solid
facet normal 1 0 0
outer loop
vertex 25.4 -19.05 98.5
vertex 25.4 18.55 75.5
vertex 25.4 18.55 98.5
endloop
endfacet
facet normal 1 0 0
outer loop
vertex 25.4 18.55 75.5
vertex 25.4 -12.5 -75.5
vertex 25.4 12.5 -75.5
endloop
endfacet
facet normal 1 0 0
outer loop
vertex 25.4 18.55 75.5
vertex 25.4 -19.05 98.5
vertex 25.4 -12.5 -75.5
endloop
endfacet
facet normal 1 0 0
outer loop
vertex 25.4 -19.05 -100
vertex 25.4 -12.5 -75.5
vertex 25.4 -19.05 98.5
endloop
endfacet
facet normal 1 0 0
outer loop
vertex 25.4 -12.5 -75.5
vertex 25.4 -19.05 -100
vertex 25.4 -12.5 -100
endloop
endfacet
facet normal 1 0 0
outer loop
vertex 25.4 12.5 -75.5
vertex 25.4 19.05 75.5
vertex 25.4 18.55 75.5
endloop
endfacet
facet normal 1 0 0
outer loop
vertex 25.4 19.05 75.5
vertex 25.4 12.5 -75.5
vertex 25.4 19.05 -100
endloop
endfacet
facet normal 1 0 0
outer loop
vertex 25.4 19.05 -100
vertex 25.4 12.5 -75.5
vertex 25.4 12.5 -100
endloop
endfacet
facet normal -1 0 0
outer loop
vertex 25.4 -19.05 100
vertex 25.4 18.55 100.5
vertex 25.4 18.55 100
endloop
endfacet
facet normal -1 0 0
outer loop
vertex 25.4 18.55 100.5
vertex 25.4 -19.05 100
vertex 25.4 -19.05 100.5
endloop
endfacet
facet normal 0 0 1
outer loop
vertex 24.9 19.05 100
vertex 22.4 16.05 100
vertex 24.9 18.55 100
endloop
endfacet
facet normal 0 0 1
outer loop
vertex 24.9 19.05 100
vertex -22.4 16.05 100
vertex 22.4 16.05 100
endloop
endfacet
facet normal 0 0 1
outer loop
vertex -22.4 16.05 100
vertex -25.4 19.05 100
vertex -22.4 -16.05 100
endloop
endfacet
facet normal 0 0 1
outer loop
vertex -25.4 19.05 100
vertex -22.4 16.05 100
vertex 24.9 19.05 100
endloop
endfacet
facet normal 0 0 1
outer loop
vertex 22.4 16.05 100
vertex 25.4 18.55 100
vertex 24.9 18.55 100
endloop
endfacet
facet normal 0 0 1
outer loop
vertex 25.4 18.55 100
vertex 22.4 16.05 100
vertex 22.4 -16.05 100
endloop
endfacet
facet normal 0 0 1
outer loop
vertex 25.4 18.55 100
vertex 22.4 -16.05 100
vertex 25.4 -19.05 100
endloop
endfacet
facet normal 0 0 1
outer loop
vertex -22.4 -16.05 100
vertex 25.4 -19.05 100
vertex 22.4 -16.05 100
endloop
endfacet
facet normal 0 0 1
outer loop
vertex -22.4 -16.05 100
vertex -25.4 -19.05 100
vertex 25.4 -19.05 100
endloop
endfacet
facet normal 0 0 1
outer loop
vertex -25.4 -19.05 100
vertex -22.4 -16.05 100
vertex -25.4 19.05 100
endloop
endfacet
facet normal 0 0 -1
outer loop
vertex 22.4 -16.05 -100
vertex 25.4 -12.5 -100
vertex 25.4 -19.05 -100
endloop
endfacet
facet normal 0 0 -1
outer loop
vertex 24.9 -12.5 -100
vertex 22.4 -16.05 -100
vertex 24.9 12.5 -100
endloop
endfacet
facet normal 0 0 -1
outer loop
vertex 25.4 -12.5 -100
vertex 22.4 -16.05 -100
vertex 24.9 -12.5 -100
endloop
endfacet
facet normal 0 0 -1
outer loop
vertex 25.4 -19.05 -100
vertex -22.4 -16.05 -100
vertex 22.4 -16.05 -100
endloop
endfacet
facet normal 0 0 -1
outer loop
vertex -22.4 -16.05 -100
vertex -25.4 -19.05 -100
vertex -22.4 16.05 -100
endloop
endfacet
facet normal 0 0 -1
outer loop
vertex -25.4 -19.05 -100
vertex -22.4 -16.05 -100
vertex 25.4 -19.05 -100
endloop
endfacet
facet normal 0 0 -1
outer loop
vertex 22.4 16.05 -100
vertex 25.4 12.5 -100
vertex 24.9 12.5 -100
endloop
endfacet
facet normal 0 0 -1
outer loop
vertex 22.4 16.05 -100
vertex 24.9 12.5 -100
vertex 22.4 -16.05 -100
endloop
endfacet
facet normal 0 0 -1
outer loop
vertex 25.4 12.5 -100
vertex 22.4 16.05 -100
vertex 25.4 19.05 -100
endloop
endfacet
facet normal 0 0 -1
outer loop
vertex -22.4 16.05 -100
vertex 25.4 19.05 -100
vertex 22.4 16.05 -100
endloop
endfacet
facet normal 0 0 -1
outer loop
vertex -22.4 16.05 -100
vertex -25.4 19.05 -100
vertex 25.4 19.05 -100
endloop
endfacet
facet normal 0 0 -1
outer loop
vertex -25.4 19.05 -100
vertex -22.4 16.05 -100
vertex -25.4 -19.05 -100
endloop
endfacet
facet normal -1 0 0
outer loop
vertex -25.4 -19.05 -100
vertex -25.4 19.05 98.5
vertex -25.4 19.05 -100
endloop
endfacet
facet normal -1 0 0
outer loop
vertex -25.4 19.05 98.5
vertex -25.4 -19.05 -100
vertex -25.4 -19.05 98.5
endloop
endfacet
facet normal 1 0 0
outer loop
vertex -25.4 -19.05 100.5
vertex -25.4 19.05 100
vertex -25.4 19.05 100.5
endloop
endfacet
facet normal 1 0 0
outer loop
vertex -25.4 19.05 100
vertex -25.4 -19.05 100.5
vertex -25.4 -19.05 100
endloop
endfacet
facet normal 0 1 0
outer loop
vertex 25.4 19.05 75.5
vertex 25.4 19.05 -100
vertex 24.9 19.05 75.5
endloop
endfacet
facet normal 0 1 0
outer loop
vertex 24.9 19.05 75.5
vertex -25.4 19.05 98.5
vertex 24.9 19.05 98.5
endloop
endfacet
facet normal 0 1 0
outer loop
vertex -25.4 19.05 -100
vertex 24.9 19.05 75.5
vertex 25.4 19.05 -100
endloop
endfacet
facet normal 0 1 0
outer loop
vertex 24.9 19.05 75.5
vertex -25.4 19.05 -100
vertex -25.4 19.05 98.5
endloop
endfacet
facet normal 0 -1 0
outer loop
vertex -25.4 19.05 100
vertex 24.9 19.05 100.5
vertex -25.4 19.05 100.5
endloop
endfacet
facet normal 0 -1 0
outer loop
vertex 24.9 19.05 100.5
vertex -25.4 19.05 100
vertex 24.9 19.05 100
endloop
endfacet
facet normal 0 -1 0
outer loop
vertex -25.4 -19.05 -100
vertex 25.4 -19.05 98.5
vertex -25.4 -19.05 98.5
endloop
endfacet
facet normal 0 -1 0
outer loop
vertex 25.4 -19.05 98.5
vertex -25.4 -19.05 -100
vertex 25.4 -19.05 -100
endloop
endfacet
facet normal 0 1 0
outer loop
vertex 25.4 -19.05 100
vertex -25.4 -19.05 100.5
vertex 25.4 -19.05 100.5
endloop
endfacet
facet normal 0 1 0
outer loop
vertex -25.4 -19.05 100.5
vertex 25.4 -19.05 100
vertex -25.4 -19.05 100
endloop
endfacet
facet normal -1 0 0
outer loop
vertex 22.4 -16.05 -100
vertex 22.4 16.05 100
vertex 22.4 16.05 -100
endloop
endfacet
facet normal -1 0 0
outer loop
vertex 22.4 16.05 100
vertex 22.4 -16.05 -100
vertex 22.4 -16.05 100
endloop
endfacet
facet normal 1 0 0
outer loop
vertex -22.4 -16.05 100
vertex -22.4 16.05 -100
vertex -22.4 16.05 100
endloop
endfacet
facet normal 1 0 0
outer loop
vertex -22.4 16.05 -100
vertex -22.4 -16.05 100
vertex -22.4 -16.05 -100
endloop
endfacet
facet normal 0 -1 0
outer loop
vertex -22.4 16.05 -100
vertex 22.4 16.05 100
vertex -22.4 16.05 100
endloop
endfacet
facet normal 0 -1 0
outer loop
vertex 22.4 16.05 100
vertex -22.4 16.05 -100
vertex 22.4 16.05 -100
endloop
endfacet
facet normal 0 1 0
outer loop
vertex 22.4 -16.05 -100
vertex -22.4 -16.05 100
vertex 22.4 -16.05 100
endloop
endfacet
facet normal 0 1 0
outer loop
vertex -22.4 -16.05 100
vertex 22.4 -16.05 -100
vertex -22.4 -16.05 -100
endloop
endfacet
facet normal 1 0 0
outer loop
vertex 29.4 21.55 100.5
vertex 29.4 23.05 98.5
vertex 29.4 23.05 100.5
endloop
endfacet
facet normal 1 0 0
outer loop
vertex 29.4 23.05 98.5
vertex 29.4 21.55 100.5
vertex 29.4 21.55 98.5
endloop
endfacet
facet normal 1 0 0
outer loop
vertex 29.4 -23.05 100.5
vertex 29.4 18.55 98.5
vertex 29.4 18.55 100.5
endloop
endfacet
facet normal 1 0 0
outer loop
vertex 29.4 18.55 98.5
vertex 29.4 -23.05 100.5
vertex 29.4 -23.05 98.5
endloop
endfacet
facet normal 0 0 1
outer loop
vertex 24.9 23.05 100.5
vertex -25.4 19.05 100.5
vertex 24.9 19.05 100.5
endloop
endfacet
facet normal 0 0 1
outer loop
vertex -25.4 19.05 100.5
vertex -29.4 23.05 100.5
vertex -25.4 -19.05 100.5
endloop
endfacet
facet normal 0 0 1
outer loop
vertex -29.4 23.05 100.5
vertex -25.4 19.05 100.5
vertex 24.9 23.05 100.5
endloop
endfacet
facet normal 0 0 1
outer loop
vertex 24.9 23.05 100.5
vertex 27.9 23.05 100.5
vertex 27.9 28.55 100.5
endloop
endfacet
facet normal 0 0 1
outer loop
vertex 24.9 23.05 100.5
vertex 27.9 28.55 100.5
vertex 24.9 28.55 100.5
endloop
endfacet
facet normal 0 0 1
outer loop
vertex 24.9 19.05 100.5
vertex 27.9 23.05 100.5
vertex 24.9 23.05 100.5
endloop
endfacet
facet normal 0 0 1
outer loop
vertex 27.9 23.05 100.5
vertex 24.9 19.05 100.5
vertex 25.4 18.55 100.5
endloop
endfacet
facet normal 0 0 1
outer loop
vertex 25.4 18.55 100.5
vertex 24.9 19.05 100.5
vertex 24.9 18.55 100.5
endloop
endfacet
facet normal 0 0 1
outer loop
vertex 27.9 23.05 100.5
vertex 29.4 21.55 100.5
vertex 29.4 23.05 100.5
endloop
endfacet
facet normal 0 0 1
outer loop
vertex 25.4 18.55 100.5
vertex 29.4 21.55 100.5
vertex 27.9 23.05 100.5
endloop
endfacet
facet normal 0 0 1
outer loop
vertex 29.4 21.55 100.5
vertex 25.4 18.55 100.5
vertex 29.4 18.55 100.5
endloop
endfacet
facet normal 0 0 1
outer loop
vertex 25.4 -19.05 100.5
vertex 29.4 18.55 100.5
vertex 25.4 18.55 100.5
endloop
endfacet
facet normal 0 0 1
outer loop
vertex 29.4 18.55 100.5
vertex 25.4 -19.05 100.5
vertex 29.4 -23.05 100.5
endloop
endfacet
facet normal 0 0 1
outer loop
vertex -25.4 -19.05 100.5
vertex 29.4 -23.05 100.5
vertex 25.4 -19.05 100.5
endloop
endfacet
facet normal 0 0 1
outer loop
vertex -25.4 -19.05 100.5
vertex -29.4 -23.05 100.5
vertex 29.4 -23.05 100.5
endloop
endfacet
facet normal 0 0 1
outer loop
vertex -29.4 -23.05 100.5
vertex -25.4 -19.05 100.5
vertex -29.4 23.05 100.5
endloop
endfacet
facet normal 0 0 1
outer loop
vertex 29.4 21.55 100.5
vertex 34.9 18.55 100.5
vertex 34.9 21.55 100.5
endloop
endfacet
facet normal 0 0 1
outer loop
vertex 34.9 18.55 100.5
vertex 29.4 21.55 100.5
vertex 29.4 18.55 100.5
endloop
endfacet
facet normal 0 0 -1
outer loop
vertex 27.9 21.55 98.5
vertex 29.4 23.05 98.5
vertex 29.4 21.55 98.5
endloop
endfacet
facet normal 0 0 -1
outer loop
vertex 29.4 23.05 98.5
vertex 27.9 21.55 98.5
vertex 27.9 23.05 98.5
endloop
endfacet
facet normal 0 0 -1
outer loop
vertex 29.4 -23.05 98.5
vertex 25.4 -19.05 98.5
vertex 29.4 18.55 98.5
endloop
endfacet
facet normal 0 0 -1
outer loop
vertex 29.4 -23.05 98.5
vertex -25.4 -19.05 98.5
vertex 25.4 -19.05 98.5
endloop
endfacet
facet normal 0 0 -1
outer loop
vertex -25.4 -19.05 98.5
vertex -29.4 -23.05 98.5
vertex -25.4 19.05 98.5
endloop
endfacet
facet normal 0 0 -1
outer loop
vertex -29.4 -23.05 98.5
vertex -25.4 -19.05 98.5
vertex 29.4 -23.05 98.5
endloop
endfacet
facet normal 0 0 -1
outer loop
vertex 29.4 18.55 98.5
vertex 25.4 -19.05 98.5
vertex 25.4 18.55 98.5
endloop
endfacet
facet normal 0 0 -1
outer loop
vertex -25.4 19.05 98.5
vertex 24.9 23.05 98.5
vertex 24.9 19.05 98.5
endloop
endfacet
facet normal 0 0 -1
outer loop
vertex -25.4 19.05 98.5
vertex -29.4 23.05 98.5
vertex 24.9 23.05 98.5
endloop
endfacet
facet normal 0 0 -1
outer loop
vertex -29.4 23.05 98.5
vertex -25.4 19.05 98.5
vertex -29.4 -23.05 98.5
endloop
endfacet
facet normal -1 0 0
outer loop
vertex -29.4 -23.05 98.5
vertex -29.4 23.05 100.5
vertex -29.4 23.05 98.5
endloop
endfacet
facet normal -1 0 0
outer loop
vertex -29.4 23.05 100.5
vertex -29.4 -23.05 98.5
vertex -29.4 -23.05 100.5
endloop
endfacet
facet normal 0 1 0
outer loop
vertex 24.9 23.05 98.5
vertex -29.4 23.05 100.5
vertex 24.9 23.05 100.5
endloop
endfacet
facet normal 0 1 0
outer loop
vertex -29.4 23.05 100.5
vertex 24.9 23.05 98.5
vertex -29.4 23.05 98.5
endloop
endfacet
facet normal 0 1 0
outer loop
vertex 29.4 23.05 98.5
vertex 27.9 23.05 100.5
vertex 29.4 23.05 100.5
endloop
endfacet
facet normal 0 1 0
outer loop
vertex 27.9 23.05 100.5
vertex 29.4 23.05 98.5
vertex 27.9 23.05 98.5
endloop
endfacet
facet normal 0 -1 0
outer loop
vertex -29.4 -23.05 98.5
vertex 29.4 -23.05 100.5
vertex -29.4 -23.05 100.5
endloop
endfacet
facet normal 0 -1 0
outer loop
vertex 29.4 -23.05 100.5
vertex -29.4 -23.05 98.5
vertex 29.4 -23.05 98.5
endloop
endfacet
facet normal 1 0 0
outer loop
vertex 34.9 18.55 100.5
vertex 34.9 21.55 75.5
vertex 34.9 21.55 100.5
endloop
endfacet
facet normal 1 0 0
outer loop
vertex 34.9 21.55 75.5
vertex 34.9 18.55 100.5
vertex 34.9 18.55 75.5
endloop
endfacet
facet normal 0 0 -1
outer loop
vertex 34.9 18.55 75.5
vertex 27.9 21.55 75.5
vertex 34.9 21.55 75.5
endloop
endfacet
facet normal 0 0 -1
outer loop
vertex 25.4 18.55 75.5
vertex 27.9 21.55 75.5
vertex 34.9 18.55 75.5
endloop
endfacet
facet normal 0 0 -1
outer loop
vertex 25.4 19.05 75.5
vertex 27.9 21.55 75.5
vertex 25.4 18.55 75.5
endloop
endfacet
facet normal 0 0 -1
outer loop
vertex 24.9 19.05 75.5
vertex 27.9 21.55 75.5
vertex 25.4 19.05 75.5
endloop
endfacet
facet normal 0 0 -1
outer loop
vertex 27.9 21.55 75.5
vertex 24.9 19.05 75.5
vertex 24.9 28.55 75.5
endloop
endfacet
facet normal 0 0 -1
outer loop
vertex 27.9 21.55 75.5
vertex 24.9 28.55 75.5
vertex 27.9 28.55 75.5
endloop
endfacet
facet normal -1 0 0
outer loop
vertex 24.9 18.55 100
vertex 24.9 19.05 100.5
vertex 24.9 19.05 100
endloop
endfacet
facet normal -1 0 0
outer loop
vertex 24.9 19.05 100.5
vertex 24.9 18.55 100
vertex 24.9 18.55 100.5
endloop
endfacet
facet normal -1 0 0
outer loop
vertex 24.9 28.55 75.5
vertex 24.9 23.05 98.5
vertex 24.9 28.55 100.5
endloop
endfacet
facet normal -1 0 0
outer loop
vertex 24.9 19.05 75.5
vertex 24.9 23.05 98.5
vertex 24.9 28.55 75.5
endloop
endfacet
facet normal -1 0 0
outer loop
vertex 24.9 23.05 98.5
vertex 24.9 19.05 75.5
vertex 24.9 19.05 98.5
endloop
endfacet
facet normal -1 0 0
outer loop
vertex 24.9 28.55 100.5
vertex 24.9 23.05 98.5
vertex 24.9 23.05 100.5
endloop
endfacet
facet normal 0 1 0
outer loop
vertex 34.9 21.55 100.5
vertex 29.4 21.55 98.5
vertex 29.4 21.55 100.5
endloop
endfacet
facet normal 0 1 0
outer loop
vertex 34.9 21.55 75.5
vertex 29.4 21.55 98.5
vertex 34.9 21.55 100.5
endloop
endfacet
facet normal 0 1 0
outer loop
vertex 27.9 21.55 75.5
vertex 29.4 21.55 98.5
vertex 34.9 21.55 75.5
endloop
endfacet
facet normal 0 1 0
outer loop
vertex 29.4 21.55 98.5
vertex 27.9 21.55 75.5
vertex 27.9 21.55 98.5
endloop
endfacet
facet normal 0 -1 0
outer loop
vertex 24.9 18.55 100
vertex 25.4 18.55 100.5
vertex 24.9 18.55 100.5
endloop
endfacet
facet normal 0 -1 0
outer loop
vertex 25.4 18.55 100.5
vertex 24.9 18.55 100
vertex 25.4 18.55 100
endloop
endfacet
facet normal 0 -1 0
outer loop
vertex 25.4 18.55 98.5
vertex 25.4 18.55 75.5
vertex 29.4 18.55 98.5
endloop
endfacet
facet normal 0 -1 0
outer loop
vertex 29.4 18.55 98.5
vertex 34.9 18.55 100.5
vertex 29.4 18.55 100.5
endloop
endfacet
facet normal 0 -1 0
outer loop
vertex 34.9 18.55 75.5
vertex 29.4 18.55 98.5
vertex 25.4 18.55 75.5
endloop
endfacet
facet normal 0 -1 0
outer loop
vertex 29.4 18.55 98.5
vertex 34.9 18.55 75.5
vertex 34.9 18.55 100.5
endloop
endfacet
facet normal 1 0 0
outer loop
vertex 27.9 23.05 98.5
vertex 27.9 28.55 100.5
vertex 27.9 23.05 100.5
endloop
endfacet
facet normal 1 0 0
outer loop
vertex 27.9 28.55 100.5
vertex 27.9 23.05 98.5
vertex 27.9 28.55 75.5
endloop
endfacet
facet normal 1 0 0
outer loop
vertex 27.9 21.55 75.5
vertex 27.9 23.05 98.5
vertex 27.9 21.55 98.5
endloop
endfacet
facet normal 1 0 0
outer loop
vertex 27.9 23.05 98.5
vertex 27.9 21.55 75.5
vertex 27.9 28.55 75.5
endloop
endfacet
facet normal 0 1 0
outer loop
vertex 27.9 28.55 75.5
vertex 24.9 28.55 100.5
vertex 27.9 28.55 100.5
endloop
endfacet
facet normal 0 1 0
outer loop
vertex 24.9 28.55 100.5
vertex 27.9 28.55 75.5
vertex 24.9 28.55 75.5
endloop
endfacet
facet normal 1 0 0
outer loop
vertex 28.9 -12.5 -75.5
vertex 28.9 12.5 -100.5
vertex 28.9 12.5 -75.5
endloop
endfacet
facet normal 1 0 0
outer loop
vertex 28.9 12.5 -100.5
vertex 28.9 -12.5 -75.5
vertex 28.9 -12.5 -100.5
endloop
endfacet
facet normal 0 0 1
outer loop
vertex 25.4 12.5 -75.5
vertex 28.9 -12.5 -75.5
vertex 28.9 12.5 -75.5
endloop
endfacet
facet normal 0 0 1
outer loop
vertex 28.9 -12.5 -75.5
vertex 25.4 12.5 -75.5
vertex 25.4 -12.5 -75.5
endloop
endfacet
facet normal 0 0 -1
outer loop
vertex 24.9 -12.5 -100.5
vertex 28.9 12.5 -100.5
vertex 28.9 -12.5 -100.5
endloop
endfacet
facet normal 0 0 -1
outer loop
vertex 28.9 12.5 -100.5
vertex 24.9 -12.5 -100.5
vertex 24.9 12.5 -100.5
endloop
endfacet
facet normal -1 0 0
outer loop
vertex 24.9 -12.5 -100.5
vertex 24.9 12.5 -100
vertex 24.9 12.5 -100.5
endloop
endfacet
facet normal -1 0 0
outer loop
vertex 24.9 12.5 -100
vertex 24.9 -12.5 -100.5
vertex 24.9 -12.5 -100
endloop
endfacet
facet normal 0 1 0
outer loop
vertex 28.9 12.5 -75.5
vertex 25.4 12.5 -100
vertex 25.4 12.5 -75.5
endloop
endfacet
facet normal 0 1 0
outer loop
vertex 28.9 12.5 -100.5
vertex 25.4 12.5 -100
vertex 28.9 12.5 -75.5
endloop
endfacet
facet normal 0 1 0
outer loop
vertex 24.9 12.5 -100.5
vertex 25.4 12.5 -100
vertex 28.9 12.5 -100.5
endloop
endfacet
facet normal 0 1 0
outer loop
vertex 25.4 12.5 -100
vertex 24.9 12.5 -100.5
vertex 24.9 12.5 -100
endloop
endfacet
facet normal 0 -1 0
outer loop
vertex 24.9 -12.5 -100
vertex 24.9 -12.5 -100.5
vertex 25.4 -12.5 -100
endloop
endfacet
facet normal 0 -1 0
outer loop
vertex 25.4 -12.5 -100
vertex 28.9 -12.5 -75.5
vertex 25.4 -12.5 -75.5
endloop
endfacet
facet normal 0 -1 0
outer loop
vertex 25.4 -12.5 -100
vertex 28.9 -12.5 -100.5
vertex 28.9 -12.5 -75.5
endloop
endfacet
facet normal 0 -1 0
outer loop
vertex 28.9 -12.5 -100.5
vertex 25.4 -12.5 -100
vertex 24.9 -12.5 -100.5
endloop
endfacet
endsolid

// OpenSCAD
// Parameters
outer_width = 50.8; //[25.4:101.6:0.1]
outer_height = 38.1; //[19.05:76.2:0.1]
wall_thickness = 3.0; //[1.5:6.0:0.1]
length = 200; //[50:1000:1]
centered = 1; //[0:1:1]
corner_fillet_radius = 0; //[0:6:0.1]
eps = 0.5; //[0.2:2:0.1]
inner_width = 44.8; //[19.4:95.6:0.1]
inner_height = 32.1; //[13.05:70.2:0.1]
bezel_thickness = 2.0; //[1.0:6.0:0.1]
bezel_outset = 4.0; //[1.0:12.0:0.1]
corner_profile_leg = 10.0; //[5.0:25.0:0.1]
corner_profile_thickness = 3.0; //[1.5:8.0:0.1]
corner_profile_length = 25.0; //[10.0:80.0:1]
shelf_bracket_width = 25.0; //[10.0:60.0:0.5]
shelf_bracket_height = 25.0; //[10.0:60.0:0.5]
shelf_bracket_thickness = 4.0; //[2.0:10.0:0.1]

// Box Section
module box_section() {
  color("Silver") {
    difference() {
      cube([outer_width, outer_height, length], center=true);
      translate([0, 0, 0])
        cube([inner_width, inner_height, length], center=true);
    }
  }
}

// Box Bezel Section
module box_bezel_section() {
  color("DimGray") {
    difference() {
      cube([outer_width + 2*bezel_outset, outer_height + 2*bezel_outset, bezel_thickness], center=true);
      translate([0, 0, eps])
        cube([outer_width, outer_height, bezel_thickness + 2*eps], center=true);
    }
  }
}

// Box Corner Profile Section
module box_corner_profile_section() {
  color("Black") {
    union() {
      translate([outer_width/2 + corner_profile_leg/2 - eps, outer_height/2 + corner_profile_thickness/2 - eps, length/2 - corner_profile_length/2 + eps])
        cube([corner_profile_leg, corner_profile_thickness, corner_profile_length], center=true);
      translate([outer_width/2 + corner_profile_thickness/2 - eps, outer_height/2 + corner_profile_leg/2 - eps, length/2 - corner_profile_length/2 + eps])
        cube([corner_profile_thickness, corner_profile_leg, corner_profile_length], center=true);
    }
  }
}

// Box Corner Profile Sections
module box_corner_profile_sections() {
  box_corner_profile_section();
}

// Box Shelf Bracket Section
module box_shelf_bracket_section() {
  color("Silver") {
    translate([outer_width/2 + shelf_bracket_thickness/2 - eps, 0, -length/2 + shelf_bracket_height/2 - eps])
      cube([shelf_bracket_thickness, shelf_bracket_width, shelf_bracket_height], center=true);
  }
}

// Assembly
module assembly() {
  box_section();
  translate([0, 0, length/2 - bezel_thickness/2 + eps]) box_bezel_section();
  box_corner_profile_sections();
  box_shelf_bracket_section();
}

assembly();
